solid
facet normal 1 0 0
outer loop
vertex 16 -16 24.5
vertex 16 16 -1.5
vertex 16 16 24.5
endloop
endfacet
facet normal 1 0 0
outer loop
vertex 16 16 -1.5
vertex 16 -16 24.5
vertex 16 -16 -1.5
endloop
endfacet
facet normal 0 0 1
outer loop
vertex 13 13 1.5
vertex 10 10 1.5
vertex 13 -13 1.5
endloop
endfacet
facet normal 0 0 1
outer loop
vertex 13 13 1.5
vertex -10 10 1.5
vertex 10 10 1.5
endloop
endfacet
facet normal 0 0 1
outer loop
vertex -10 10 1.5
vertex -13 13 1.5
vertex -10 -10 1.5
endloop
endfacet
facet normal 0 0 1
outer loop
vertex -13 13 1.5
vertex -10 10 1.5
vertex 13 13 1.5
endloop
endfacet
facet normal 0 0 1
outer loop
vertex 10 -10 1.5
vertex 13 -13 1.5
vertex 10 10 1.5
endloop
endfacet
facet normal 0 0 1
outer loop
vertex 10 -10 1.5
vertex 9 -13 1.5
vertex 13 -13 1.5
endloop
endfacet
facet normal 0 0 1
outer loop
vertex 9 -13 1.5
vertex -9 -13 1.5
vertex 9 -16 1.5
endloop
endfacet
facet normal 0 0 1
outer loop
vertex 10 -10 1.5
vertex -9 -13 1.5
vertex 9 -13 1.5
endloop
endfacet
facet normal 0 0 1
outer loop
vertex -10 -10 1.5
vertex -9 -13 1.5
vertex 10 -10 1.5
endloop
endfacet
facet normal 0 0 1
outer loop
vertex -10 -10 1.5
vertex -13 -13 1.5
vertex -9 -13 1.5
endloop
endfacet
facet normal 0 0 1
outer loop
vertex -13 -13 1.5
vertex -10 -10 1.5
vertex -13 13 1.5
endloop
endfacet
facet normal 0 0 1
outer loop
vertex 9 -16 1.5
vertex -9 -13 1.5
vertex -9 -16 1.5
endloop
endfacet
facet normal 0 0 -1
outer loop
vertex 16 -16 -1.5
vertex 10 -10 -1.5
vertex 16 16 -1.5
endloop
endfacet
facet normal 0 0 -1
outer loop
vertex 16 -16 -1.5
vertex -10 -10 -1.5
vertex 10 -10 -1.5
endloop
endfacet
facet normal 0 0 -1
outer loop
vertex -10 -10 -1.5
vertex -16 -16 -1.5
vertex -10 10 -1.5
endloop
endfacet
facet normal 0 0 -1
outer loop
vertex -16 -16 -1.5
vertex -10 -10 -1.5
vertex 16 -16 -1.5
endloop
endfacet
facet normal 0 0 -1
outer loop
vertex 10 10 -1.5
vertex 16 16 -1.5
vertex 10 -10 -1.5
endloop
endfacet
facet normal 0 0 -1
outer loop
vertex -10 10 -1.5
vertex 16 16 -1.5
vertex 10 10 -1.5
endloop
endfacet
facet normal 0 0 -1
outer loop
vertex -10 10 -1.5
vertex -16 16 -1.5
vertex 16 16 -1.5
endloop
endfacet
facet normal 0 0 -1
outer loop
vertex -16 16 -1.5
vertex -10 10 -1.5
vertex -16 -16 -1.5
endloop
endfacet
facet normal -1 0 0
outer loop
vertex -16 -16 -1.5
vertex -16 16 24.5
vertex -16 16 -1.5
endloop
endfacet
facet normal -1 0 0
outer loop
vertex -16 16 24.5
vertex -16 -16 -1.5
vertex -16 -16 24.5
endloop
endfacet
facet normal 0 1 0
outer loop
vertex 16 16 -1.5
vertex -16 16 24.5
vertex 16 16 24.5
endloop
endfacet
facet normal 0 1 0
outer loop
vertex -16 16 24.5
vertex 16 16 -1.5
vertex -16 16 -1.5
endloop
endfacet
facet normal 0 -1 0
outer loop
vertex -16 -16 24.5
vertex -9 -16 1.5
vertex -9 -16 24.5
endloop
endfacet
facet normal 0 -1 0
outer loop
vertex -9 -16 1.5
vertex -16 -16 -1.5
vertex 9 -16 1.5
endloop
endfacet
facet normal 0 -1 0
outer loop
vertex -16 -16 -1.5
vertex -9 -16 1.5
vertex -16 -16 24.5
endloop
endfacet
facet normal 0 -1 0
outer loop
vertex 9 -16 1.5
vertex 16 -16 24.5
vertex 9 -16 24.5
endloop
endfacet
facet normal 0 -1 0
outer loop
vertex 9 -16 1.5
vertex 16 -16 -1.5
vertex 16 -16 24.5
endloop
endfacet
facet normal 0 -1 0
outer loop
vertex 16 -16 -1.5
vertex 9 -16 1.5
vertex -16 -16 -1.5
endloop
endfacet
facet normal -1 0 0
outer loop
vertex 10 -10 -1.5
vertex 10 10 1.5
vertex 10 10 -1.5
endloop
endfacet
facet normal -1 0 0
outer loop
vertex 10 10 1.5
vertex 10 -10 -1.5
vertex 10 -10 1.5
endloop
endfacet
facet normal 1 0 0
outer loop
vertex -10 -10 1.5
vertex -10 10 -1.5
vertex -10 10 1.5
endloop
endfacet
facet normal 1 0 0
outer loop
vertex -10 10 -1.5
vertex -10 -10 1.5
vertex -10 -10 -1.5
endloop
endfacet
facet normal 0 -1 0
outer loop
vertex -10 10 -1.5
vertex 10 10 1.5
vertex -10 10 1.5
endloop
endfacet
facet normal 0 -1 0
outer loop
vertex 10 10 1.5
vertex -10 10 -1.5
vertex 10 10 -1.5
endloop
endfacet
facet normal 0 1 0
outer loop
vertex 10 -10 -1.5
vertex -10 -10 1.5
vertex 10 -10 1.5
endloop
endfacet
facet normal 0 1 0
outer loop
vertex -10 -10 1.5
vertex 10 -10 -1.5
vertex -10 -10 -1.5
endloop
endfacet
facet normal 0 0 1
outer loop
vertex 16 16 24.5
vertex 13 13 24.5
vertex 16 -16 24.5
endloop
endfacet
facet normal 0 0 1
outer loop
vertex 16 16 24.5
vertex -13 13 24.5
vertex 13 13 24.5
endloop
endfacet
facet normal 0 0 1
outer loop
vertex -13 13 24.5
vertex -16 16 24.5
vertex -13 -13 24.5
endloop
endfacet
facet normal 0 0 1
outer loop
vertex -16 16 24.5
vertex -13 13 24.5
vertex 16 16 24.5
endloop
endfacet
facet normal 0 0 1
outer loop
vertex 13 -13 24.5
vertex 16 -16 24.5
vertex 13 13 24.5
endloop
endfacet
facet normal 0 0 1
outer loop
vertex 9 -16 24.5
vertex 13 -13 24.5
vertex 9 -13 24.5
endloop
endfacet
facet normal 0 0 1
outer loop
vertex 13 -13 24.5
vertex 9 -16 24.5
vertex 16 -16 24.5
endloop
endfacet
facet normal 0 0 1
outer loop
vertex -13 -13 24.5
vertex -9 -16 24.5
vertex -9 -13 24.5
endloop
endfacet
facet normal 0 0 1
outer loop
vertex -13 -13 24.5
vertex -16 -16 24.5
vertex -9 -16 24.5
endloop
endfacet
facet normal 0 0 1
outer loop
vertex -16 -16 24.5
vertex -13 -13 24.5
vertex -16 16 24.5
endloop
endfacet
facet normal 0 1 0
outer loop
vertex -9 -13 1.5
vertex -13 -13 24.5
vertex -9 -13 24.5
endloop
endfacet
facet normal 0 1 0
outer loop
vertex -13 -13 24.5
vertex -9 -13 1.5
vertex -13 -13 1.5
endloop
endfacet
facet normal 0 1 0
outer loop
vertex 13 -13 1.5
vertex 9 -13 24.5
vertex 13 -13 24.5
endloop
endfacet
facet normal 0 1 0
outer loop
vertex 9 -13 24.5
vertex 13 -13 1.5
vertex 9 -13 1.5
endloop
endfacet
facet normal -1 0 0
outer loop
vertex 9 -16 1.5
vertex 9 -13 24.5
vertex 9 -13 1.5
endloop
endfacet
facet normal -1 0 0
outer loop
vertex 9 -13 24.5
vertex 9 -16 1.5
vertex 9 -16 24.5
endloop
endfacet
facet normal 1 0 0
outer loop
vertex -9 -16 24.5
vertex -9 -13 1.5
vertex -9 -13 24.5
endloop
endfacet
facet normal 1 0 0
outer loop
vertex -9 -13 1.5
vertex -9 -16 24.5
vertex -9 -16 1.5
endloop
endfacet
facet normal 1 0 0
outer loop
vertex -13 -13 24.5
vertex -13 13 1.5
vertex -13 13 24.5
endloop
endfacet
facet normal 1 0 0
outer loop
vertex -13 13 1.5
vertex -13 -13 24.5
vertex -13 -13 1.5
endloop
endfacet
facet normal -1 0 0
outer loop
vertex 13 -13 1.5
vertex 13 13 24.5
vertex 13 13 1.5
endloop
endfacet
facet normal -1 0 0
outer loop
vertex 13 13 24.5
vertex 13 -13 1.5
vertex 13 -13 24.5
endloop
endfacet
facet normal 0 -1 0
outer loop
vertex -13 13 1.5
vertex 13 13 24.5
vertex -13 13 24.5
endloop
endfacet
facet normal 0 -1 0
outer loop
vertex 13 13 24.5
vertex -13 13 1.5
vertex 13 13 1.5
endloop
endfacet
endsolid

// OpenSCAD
tilesize = 24;
tilethickness = 2;
tilequantity = 10;
wallthickness = 3;
openinglip = 4;
tilehalf = tilesize/2;

//base
difference() {
cube([((tilesize+2)+(wallthickness*2)),((tilesize+2)+(wallthickness*2)),wallthickness],true);
cube([tilesize-4,tilesize-4,wallthickness*2],true);
}


//left wall
translate([
((tilehalf+1+(wallthickness/2))*-1),
0,
((tilequantity*tilethickness/2)+(wallthickness*.5))])

cube([
wallthickness,
((tilesize+2)+(wallthickness*2)),
((tilequantity*tilethickness)+(wallthickness*2))],true);

//right wall
translate([
(tilehalf+1+(wallthickness/2)),
0,
((tilequantity*tilethickness/2)+(wallthickness*.5))])

cube([
wallthickness,
((tilesize+2)+(wallthickness*2)),
((tilequantity*tilethickness)+(wallthickness*2))],true);

//back wall
translate([
0,

(tilehalf+1+(wallthickness/2)),

((tilequantity*tilethickness/2)+(wallthickness*.5))])

cube([
((tilesize+2)+(wallthickness*2)),

wallthickness,

((tilequantity*tilethickness)+(wallthickness*2))],

true);

difference(){
//front wall
translate([
0,((tilehalf+1+(wallthickness/2))*-1),((tilequantity*tilethickness/2)+(wallthickness*.5))])
cube([
((tilesize+2)+(wallthickness*2)),wallthickness,((tilequantity*tilethickness)+(wallthickness*2))],true);

translate([
0,((tilehalf+1+(wallthickness/2))*-1),wallthickness*2])
cube([(tilesize+2)-(openinglip*2),wallthickness*2,(tilequantity*tilethickness*4)],true);
}


